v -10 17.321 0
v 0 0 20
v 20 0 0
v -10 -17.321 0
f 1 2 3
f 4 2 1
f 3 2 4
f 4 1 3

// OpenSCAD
//-- Cilindro normal. r es el radio, h es la altura
*cylinder (r = 20, h = 20, $fn = 100);

//-- Cono truncado. r1 radio base inferior, r2 radio de la base superior
*cylinder (r1 = 20, r2 = 10, h = 20, $fn = 100);

//-- Cono
*cylinder (r1 = 20, r2 = 0, h = 20, $fn = 100);

//-- Piramide truncada de base hexagonal
*cylinder (r1 = 20, r2 = 10, h = 20, $fn = 6);

//-- Piramide
*cylinder (r1 = 20, r2 = 0, h = 20, $fn = 4);

//-- Tetraedro
cylinder (r1 = 20, r2 = 0, h = 20, $fn = 3);
